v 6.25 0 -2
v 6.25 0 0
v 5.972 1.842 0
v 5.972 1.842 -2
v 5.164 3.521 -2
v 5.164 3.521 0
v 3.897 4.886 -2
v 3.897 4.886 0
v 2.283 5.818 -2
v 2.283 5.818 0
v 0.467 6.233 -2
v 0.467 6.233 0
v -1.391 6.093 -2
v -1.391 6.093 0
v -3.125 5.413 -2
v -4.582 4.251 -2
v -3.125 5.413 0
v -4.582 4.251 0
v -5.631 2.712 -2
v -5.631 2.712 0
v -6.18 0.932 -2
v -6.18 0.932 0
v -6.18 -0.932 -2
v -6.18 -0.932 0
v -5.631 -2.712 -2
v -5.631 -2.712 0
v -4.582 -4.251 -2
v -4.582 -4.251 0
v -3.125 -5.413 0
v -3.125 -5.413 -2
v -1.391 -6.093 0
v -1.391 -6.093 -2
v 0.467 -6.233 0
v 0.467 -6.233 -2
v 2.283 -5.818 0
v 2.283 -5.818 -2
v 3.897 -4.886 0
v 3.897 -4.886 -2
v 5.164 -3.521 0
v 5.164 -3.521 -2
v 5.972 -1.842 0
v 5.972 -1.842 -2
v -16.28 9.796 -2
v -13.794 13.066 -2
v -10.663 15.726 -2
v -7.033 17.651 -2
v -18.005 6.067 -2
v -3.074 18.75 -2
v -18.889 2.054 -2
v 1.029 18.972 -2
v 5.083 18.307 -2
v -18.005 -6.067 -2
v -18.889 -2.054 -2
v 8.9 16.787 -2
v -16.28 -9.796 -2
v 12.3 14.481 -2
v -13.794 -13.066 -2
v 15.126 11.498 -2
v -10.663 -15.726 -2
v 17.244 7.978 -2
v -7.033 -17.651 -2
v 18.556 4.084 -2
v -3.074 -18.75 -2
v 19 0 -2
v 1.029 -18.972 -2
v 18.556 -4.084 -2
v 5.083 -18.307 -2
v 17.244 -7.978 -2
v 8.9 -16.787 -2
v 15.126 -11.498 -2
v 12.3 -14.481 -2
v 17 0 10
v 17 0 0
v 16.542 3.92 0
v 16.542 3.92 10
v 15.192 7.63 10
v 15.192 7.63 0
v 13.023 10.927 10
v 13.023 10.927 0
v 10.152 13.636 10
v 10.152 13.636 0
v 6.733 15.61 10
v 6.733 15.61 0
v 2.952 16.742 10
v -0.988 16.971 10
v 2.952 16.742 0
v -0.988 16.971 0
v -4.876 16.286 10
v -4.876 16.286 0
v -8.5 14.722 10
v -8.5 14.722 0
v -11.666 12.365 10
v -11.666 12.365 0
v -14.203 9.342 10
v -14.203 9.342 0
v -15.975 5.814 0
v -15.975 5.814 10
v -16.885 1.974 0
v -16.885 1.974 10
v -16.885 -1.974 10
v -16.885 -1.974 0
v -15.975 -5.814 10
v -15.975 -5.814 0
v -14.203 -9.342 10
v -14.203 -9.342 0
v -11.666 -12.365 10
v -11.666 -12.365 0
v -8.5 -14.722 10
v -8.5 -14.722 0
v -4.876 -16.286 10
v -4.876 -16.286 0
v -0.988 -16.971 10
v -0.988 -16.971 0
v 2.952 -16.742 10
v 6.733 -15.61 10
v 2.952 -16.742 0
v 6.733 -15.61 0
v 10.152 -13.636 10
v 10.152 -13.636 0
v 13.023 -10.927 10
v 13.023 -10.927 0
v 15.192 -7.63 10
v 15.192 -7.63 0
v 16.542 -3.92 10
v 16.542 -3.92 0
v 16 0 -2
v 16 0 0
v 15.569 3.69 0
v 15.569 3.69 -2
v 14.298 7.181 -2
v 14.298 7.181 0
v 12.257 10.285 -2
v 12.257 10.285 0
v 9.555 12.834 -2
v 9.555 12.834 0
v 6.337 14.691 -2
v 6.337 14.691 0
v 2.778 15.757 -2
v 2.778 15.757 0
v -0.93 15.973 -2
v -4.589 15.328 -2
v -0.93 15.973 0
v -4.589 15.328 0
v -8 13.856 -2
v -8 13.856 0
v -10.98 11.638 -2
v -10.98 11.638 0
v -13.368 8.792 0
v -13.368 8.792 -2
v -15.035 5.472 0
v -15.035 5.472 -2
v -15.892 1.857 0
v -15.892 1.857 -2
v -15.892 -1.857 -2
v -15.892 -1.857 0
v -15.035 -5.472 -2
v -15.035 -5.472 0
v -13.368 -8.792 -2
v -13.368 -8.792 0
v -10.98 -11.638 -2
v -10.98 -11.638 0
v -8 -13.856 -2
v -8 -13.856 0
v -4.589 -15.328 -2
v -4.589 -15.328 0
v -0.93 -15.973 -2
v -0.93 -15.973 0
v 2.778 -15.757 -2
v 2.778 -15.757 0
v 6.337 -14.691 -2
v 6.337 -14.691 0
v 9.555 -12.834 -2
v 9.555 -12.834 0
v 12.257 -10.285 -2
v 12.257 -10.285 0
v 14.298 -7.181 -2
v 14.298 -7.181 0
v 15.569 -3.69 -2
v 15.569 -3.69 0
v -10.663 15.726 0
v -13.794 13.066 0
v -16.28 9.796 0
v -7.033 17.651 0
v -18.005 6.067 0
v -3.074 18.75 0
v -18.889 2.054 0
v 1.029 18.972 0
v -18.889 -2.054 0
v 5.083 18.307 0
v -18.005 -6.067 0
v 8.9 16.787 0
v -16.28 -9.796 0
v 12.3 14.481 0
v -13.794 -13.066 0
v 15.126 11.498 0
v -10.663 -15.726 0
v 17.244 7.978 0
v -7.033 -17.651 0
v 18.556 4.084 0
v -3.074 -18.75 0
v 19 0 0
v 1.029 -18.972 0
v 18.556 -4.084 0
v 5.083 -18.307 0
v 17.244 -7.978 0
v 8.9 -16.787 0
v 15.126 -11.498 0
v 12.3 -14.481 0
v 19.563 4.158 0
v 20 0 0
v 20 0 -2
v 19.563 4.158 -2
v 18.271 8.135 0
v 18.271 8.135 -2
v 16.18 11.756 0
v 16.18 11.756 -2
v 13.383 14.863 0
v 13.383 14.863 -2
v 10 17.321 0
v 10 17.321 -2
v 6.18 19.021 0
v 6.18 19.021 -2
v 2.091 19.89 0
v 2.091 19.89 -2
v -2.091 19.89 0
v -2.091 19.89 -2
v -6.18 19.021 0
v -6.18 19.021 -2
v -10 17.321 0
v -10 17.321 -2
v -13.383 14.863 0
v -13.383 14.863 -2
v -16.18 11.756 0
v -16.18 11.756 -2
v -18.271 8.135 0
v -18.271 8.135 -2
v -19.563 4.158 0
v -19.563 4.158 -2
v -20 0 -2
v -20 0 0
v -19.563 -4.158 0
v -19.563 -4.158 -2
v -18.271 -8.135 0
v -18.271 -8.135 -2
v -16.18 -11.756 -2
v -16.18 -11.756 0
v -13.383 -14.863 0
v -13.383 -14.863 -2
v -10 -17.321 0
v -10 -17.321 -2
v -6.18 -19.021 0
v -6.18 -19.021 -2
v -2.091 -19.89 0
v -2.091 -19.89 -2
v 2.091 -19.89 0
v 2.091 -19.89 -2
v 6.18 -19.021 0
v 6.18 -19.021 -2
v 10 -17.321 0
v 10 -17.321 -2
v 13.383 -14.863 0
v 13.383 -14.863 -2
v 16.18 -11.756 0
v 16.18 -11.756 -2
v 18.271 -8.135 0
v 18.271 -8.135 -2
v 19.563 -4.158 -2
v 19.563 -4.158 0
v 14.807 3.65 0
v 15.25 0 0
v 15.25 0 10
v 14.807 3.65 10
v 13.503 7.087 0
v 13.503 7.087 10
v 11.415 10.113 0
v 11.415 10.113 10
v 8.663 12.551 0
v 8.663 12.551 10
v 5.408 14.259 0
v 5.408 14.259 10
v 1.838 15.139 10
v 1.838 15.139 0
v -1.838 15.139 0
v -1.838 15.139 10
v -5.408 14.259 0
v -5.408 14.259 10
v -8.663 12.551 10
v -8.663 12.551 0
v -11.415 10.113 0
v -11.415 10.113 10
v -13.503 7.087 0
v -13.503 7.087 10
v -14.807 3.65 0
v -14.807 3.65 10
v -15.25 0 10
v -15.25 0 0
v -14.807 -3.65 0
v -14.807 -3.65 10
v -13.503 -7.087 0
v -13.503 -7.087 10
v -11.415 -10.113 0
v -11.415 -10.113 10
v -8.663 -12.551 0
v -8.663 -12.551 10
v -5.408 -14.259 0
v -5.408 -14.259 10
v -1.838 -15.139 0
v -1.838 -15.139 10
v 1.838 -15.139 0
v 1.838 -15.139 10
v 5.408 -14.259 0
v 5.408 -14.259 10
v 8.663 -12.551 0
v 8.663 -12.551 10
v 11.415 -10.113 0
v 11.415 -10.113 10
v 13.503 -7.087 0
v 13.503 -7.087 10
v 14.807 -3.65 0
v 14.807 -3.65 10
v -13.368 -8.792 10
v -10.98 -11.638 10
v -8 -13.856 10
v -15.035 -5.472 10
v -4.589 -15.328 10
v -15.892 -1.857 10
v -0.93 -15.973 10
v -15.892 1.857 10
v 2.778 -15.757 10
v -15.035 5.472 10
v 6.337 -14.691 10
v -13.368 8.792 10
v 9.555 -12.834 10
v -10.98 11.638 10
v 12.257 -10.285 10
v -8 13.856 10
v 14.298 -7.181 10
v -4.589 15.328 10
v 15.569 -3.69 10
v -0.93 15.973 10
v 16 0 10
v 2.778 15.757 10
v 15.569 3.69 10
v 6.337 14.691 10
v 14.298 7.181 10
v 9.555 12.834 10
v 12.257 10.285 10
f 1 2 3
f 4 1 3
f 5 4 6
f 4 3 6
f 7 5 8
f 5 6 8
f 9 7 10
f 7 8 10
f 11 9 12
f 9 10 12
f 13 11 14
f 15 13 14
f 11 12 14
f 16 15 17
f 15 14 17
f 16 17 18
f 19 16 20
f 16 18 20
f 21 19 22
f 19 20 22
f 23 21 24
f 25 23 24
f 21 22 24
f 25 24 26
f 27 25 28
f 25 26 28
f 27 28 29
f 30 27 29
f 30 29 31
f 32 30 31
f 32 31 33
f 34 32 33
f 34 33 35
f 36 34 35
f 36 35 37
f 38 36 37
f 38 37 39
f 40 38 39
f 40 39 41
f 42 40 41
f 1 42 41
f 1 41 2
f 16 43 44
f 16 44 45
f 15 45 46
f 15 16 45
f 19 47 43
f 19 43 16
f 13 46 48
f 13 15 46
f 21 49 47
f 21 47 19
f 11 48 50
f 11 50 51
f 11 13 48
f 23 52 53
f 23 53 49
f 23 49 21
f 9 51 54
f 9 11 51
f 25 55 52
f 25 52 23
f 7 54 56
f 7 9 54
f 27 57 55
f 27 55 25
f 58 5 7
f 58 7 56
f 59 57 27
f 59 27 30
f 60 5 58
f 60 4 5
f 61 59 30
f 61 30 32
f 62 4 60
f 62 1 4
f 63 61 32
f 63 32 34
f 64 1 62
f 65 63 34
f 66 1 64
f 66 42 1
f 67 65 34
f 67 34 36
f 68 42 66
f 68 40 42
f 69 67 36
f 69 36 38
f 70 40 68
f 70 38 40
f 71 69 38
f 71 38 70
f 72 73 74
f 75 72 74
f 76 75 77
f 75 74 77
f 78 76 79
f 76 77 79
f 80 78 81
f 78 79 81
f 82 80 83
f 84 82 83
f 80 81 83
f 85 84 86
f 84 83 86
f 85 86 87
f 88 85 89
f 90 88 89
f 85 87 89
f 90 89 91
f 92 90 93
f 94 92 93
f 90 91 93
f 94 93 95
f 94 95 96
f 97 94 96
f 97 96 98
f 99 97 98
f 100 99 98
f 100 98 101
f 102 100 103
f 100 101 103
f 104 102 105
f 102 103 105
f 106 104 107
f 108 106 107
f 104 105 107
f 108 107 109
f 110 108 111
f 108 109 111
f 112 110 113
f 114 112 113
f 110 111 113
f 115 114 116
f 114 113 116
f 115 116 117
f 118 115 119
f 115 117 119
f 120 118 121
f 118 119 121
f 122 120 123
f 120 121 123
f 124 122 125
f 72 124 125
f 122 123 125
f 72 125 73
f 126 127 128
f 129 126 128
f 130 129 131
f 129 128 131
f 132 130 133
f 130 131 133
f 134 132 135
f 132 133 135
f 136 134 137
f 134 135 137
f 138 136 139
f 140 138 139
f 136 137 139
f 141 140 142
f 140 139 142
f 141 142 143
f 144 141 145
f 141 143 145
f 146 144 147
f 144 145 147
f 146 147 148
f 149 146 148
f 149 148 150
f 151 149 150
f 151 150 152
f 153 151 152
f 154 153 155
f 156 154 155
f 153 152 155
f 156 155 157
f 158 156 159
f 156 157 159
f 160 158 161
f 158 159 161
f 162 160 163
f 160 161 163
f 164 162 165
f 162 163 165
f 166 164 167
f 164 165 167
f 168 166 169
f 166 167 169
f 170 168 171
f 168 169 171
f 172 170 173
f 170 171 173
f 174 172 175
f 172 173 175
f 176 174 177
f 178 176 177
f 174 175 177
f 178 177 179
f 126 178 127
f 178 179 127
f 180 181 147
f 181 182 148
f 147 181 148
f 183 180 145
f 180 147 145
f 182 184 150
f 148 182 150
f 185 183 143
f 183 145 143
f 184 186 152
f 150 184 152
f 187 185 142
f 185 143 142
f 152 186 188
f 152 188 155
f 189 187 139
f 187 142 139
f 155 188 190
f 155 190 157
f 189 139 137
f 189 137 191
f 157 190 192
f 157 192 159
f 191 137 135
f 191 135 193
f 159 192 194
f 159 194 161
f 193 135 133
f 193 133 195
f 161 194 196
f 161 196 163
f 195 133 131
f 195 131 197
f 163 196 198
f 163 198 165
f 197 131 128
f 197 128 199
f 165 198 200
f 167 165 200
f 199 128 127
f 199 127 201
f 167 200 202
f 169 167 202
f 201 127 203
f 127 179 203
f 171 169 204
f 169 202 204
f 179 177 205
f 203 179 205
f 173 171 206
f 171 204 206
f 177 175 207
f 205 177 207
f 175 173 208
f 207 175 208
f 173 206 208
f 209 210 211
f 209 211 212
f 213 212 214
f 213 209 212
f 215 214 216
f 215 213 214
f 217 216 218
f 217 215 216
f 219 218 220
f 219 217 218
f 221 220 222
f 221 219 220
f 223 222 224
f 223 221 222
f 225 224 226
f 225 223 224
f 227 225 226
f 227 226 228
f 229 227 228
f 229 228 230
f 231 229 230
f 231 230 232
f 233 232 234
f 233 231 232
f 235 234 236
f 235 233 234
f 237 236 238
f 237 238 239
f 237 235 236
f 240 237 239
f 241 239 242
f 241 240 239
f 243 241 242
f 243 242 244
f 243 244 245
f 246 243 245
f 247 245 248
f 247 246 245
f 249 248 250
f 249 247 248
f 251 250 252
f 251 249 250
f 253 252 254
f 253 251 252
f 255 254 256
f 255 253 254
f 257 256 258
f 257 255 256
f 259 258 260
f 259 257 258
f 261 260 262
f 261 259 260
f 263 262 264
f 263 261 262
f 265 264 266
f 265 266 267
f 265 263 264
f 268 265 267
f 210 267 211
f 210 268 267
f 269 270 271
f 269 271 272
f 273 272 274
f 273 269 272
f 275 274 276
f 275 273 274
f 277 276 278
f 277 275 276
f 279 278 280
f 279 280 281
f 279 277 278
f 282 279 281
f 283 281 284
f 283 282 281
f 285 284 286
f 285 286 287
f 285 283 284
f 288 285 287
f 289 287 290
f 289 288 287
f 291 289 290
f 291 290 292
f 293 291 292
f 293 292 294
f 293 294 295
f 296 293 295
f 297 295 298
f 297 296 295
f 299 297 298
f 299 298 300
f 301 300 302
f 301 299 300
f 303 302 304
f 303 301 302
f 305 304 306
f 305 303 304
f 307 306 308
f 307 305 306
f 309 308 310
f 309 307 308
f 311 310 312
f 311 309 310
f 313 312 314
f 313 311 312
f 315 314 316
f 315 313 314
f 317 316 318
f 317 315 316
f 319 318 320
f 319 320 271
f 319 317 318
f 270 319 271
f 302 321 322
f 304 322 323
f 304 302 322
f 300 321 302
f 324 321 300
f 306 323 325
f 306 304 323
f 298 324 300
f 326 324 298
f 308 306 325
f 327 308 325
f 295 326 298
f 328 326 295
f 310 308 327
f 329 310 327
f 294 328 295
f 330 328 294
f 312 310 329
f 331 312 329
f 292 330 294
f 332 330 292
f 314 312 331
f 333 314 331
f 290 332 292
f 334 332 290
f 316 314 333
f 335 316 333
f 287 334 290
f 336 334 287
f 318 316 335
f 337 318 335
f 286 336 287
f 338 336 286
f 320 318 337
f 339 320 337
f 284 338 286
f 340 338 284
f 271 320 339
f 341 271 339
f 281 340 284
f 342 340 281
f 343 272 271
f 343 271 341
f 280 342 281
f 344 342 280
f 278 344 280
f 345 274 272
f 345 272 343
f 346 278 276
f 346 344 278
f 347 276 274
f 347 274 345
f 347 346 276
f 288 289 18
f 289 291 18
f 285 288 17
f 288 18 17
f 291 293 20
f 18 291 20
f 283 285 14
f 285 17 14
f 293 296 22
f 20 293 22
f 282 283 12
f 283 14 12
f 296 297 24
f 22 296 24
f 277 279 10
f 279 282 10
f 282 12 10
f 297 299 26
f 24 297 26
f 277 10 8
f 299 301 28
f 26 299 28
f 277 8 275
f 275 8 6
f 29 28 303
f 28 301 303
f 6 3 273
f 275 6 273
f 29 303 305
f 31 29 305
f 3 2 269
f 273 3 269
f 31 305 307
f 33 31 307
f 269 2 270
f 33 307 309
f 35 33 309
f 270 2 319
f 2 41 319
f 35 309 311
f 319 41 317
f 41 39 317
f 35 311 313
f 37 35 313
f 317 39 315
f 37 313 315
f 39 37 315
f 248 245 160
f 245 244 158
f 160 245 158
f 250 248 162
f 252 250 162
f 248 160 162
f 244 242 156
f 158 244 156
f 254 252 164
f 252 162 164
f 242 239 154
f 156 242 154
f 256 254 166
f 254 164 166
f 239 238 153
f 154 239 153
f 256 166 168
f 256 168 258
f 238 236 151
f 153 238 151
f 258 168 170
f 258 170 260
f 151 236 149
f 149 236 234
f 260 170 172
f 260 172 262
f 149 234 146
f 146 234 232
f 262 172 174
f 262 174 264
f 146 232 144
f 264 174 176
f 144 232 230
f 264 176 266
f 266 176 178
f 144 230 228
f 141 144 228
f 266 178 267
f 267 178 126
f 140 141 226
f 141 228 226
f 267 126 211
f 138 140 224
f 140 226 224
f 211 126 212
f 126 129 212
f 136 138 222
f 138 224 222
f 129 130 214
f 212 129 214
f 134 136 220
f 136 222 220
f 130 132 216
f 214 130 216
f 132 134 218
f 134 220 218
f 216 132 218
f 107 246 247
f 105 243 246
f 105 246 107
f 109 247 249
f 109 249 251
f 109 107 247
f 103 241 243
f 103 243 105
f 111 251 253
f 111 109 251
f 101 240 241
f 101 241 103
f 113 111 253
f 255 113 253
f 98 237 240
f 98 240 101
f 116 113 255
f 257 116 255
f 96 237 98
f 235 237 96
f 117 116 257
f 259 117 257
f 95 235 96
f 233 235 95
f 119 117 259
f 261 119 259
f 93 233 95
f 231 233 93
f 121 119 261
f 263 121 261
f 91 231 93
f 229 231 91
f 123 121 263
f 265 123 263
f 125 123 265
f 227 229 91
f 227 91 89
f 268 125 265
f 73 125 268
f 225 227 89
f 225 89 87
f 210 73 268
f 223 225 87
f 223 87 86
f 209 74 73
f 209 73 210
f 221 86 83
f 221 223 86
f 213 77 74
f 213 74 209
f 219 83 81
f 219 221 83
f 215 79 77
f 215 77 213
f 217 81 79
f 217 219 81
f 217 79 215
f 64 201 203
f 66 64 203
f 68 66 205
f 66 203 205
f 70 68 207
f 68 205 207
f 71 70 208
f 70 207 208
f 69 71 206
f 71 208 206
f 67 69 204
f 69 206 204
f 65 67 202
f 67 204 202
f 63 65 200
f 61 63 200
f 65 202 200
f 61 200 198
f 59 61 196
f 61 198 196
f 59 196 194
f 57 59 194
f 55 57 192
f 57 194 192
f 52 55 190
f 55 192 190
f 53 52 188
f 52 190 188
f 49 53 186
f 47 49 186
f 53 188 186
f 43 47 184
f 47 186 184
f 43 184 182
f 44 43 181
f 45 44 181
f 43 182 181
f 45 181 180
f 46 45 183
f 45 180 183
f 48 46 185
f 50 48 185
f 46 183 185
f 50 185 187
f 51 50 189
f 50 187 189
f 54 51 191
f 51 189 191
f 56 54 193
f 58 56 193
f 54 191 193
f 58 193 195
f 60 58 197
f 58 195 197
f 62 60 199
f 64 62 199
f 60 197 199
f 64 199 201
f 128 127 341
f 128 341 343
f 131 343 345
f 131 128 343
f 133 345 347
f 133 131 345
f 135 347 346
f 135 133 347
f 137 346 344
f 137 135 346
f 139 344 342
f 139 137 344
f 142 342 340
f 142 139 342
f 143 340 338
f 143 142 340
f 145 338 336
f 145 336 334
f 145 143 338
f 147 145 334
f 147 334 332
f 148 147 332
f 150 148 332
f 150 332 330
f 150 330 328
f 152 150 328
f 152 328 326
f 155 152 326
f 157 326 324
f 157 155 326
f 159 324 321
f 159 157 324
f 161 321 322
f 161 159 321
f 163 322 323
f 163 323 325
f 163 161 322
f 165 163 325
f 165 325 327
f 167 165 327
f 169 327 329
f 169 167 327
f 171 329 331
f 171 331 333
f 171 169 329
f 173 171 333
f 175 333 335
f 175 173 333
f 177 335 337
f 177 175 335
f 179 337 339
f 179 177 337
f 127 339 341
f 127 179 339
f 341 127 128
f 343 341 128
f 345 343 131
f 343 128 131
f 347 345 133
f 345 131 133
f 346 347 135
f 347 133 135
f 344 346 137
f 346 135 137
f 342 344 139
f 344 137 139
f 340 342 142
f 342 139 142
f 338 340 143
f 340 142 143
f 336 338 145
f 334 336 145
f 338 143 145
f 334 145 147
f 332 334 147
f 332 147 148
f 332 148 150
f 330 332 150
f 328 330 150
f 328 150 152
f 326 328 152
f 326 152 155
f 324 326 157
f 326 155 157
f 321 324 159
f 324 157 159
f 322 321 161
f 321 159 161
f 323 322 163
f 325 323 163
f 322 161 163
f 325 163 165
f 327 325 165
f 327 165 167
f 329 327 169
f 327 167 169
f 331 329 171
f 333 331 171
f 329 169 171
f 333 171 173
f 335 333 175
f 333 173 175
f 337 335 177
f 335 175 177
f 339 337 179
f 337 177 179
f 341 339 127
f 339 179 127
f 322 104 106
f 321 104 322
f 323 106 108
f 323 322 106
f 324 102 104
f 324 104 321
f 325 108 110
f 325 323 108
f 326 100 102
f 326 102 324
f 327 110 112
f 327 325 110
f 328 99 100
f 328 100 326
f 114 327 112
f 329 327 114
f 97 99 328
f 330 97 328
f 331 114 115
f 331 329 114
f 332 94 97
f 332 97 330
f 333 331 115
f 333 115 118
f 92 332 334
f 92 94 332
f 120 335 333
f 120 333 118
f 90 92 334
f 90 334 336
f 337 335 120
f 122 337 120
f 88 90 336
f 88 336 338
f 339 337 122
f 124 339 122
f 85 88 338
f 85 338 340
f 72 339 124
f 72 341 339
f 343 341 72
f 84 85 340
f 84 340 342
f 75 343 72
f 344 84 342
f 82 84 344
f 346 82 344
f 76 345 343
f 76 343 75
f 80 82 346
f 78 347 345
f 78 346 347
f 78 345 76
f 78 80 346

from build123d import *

# Parameters (mm, degrees)
SKETCH_R             = 16
SKETCH_R_2           = 15.25
PAD_DEPTH            = 10
SKETCH001_R          = 19
PAD003_DEPTH         = 2
SKETCH005_R          = 6.25
POCKET004_DEPTH      = 2.001
POCKET004_DEPTH_BACK = -10.001
SKETCH006_R          = 17
SKETCH006_R_2        = 16
PAD001_DEPTH         = 10
SKETCH007_R          = 20
SKETCH007_R_2        = 16
PAD002_DEPTH         = 2


with BuildPart() as insert:
    # Sketch → Pad (new body)
    with BuildSketch(Plane.XY):
        Circle(SKETCH_R)
        Circle(SKETCH_R_2, mode=Mode.SUBTRACT)
    extrude(amount=PAD_DEPTH)

    # Sketch001 (on Face3 of Pad) → Pad003 (join)
    with BuildSketch(Plane(origin=(0, 0, 0), x_dir=(1, 0, 0), z_dir=(0, 0, -1))):
        Circle(SKETCH001_R)
    extrude(amount=PAD003_DEPTH)

    # Sketch005 → Pocket004 (cut, two sides)
    with BuildSketch(Plane.XY) as pocket004_sk:
        Circle(SKETCH005_R)
    extrude(amount=-POCKET004_DEPTH, mode=Mode.SUBTRACT)
    extrude(pocket004_sk.sketch, amount=-POCKET004_DEPTH_BACK, mode=Mode.SUBTRACT)


with BuildPart() as rim:
    # Sketch006 → Pad001 (new body)
    with BuildSketch(Plane.XY):
        Circle(SKETCH006_R)
        Circle(SKETCH006_R_2, mode=Mode.SUBTRACT)
    extrude(amount=PAD001_DEPTH)

    # Sketch007 → Pad002 (join)
    with BuildSketch(Plane.XY):
        Circle(SKETCH007_R)
        Circle(SKETCH007_R_2, mode=Mode.SUBTRACT)
    extrude(amount=-PAD002_DEPTH)


solid = Compound([insert.part, rim.part])
